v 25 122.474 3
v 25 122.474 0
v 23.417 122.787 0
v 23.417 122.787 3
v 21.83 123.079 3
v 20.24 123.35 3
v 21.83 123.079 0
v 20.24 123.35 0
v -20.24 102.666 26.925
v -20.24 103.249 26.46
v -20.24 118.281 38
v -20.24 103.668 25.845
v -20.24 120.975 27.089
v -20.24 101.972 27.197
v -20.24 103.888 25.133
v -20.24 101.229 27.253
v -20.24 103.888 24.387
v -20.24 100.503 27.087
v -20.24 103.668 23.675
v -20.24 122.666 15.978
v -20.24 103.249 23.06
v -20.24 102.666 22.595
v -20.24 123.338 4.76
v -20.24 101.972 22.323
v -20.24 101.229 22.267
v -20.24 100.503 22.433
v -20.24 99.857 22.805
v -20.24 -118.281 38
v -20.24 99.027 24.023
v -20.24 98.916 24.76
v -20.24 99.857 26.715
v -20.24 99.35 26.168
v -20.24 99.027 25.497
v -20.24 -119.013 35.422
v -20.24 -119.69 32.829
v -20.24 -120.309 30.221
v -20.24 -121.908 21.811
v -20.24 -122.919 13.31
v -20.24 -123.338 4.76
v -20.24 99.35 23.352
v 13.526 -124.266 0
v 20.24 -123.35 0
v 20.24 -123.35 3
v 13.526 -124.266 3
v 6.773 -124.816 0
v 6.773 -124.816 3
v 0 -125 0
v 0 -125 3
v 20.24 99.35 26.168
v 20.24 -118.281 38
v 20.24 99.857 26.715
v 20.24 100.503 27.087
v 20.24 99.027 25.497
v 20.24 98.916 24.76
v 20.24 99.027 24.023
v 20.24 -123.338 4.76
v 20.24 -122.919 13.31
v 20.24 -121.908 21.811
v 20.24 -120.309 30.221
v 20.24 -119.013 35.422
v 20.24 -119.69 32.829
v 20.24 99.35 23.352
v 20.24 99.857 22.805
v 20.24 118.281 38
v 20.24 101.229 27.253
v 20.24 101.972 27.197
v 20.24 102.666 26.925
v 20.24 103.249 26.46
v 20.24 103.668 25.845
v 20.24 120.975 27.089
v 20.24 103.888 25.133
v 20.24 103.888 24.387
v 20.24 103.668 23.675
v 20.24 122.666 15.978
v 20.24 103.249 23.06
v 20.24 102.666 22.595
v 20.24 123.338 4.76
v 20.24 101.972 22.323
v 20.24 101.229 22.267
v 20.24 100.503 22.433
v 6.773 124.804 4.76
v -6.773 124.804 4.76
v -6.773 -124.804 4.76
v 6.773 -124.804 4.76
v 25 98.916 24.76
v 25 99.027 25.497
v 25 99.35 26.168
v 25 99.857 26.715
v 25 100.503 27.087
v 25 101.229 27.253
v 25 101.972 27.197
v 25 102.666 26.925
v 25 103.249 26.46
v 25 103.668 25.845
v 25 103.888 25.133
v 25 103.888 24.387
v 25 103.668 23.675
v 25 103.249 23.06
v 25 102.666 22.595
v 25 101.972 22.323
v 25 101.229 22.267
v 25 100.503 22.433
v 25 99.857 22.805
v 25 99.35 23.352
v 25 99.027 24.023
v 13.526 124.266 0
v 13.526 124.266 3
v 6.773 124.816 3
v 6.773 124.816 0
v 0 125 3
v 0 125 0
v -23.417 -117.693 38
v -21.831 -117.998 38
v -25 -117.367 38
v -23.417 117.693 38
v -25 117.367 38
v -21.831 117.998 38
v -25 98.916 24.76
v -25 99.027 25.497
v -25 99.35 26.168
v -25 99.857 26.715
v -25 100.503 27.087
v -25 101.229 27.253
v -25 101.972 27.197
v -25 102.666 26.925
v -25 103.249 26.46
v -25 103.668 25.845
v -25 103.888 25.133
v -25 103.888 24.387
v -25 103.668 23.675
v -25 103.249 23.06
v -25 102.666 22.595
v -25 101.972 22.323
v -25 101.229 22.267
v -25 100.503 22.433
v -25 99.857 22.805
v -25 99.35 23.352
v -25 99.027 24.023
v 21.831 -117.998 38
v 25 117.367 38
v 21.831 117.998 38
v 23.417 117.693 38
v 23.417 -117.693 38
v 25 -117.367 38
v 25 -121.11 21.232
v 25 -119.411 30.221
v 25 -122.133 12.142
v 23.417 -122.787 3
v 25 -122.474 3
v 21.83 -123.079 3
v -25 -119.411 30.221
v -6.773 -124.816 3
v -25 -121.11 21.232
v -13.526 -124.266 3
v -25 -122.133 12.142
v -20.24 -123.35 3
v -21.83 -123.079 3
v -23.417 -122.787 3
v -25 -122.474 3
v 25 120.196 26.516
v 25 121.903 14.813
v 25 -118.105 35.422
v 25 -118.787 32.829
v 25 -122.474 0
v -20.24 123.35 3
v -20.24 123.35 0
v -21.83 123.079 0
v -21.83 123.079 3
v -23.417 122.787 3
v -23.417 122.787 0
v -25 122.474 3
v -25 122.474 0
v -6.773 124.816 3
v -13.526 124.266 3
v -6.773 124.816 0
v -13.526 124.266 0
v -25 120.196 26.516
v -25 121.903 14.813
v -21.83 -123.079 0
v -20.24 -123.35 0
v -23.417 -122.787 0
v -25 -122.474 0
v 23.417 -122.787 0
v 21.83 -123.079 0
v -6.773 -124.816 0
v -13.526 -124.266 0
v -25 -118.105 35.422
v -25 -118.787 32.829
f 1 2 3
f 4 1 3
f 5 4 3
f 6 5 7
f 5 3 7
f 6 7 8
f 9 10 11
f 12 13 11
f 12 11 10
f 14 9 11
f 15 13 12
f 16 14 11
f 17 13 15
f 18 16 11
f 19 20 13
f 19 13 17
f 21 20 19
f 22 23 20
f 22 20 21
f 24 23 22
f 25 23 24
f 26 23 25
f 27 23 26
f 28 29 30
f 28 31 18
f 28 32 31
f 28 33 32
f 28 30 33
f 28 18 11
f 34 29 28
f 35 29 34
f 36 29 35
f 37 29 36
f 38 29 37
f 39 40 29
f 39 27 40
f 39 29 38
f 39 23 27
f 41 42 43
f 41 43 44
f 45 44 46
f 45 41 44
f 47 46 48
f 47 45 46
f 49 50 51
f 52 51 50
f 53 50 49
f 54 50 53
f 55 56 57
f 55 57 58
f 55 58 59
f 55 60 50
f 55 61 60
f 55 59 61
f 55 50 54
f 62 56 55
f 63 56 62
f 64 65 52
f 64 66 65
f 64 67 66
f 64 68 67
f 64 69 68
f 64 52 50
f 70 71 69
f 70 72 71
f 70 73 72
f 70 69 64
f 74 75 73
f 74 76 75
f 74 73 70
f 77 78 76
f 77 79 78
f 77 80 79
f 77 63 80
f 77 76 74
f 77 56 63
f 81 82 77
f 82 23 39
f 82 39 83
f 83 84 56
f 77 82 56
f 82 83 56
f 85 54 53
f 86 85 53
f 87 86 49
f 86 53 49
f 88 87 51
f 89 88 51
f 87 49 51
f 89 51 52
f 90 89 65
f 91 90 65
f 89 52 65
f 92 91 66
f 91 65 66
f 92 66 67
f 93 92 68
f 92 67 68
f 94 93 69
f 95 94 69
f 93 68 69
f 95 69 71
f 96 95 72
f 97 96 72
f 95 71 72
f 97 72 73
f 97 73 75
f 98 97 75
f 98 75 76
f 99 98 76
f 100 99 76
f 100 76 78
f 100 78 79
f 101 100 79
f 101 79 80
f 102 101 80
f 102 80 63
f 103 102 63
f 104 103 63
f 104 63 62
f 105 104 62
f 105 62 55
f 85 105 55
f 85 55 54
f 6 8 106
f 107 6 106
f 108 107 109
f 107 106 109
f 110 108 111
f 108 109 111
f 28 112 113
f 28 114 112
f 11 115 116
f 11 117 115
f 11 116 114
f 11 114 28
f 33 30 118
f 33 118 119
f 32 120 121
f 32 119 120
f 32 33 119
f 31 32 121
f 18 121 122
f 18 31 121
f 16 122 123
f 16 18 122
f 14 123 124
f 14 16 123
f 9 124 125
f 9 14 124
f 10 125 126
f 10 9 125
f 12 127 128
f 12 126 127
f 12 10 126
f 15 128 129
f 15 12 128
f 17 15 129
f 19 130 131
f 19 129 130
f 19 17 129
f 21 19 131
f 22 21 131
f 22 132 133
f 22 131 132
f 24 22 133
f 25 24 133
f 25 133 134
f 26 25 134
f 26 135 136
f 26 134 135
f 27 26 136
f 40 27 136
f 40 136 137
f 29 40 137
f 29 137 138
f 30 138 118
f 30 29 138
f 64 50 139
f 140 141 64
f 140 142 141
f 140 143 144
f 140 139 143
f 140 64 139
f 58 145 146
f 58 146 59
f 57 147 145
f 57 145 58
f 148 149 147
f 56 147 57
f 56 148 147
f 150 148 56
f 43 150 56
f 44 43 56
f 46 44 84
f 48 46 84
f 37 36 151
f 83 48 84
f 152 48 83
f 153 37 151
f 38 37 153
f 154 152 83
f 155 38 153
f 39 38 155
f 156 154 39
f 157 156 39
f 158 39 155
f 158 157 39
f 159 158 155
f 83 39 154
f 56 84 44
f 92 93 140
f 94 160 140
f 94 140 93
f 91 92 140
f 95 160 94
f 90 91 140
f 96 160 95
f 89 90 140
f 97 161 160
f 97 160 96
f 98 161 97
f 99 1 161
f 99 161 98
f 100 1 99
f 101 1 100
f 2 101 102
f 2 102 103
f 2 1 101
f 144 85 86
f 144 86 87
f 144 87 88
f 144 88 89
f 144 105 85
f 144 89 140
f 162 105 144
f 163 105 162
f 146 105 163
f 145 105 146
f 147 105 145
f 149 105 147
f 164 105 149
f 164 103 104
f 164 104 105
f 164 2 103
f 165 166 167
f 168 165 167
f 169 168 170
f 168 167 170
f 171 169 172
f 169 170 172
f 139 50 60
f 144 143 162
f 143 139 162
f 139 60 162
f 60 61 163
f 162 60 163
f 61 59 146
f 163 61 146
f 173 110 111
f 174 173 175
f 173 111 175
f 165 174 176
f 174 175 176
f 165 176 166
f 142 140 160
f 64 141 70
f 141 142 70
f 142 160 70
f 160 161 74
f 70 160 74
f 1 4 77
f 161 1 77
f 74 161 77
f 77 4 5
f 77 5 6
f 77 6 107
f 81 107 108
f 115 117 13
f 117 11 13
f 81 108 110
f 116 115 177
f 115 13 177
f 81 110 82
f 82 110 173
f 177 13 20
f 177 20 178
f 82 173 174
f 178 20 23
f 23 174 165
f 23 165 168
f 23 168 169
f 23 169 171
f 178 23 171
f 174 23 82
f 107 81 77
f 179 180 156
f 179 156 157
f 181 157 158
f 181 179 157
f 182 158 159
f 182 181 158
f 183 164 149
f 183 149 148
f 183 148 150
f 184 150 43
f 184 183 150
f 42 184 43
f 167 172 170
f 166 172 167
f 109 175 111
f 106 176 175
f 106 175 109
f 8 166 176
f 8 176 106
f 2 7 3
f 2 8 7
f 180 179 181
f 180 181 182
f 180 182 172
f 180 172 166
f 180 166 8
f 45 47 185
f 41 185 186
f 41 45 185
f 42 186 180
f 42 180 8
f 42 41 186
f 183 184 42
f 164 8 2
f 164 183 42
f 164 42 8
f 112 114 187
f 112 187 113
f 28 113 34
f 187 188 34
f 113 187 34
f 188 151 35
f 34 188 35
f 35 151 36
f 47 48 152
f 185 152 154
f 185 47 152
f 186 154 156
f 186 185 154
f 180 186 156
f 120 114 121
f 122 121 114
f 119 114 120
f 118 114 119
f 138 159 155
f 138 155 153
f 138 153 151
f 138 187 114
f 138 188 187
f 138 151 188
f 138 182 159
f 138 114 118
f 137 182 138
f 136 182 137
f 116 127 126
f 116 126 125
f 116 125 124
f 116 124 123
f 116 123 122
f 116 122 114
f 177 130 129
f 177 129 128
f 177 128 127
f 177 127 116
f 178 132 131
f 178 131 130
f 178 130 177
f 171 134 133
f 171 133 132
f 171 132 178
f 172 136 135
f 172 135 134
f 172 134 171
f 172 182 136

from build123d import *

# Parameters (mm, degrees)
F1_DEPTH      = 4.76
F4_DEPTH      = 38
F8_R          = 2.5
F9_DEPTH      = 4.7610001
F9_DEPTH_BACK = 45.2410001


# Not quite as in the source:
# - a feature names something its author has since deleted; it is built from what else it names


with BuildPart() as f1:
    # F0 (on Top) → F1 (new body)
    with BuildSketch(Plane.XY):
        with BuildLine():
            Line((20.24, 120.3093612318), (20.24, 123.3504860144))
            ThreePointArc((20.24, 123.3504860144), (10.1535522896, 124.5869390261), (0, 125))
            Line((0, 125), (0, 122))
            ThreePointArc((0, 122), (10.1552432202, 121.5766056244), (20.24, 120.3093612318))
        make_face()
        with BuildLine():
            Line((25, 90.3494910666), (25, 119.4110547646))
            ThreePointArc((25, 119.4110547646), (22.6244588582, 119.8838348626), (20.24, 120.3093612318))
            Line((20.24, 120.3093612318), (20.24, 105.3494910666))
            Line((20.24, 105.3494910666), (20.24, 90.3494910666))
            Line((20.24, 90.3494910666), (25, 90.3494910666))
        make_face()
        with BuildLine():
            ThreePointArc((-20.24, -120.3093612318), (-10.1552432202, -121.5766056244), (0, -122))
            Line((0, -122), (0, 0))
            Line((0, 0), (0, 101.8494910666))
            Line((0, 101.8494910666), (-3.5, 101.8494910666))
            Line((-3.5, 101.8494910666), (-3.5, 108.8494910666))
            Line((-3.5, 108.8494910666), (0, 108.8494910666))
            Line((0, 108.8494910666), (0, 122))
            ThreePointArc((0, 122), (-10.1552432202, 121.5766056244), (-20.24, 120.3093612318))
            Line((-20.24, 120.3093612318), (-20.24, 107.6747455333))
            Line((-20.24, 107.6747455333), (-20.24, 90.3494910666))
            Line((-20.24, 90.3494910666), (-20.24, -120.3093612318))
        make_face()
        with BuildLine():
            Line((0, 0), (0, -122))
            ThreePointArc((0, -122), (10.1552432202, -121.5766056244), (20.24, -120.3093612318))
            Line((20.24, -120.3093612318), (20.24, 90.3494910666))
            Line((20.24, 90.3494910666), (20.24, 105.3494910666))
            Line((20.24, 105.3494910666), (20.24, 120.3093612318))
            ThreePointArc((20.24, 120.3093612318), (10.1552432202, 121.5766056244), (0, 122))
            Line((0, 122), (0, 108.8494910666))
            Line((0, 108.8494910666), (3.5, 108.8494910666))
            Line((3.5, 108.8494910666), (3.5, 101.8494910666))
            Line((3.5, 101.8494910666), (0, 101.8494910666))
            Line((0, 101.8494910666), (0, 0))
        make_face()
        with BuildLine():
            Line((0, 122), (0, 125))
            ThreePointArc((0, 125), (-10.1535522896, 124.5869390261), (-20.24, 123.3504860144))
            Line((-20.24, 123.3504860144), (-20.24, 120.3093612318))
            ThreePointArc((-20.24, 120.3093612318), (-10.1552432202, 121.5766056244), (0, 122))
        make_face()
        with BuildLine():
            Line((25, -119.4110547646), (25, 90.3494910666))
            Line((25, 90.3494910666), (20.24, 90.3494910666))
            Line((20.24, 90.3494910666), (20.24, -120.3093612318))
            ThreePointArc((20.24, -120.3093612318), (22.6244588582, -119.8838348626), (25, -119.4110547646))
        make_face()
        with BuildLine():
            ThreePointArc((-20.24, 120.3093612318), (-22.6244588582, 119.8838348626), (-25, 119.4110547646))
            Line((-25, 119.4110547646), (-25, 90.3494910666))
            Line((-25, 90.3494910666), (-20.24, 90.3494910666))
            Line((-20.24, 90.3494910666), (-20.24, 107.6747455333))
            Line((-20.24, 107.6747455333), (-20.24, 120.3093612318))
        make_face()
        with BuildLine():
            ThreePointArc((-25, -119.4110547646), (-22.6244588582, -119.8838348626), (-20.24, -120.3093612318))
            Line((-20.24, -120.3093612318), (-20.24, 90.3494910666))
            Line((-20.24, 90.3494910666), (-25, 90.3494910666))
            Line((-25, 90.3494910666), (-25, -119.4110547646))
        make_face()
    extrude(amount=F1_DEPTH)

    # F0 (on Top) → F4 (join)
    with BuildSketch(Plane.XY):
        with BuildLine():
            ThreePointArc((-20.24, 123.3504860144), (-22.6242401752, 122.9355268281), (-25, 122.4744871392))
            Line((-25, 122.4744871392), (-25, 119.4110547646))
            ThreePointArc((-25, 119.4110547646), (-22.6244588582, 119.8838348626), (-20.24, 120.3093612318))
            Line((-20.24, 120.3093612318), (-20.24, 123.3504860144))
        make_face()
        with BuildLine():
            ThreePointArc((-20.24, 120.3093612318), (-22.6244588582, 119.8838348626), (-25, 119.4110547646))
            Line((-25, 119.4110547646), (-25, 90.3494910666))
            Line((-25, 90.3494910666), (-20.24, 90.3494910666))
            Line((-20.24, 90.3494910666), (-20.24, 107.6747455333))
            Line((-20.24, 107.6747455333), (-20.24, 120.3093612318))
        make_face()
        with BuildLine():
            Line((25, 90.3494910666), (25, 119.4110547646))
            ThreePointArc((25, 119.4110547646), (22.6244588582, 119.8838348626), (20.24, 120.3093612318))
            Line((20.24, 120.3093612318), (20.24, 105.3494910666))
            Line((20.24, 105.3494910666), (20.24, 90.3494910666))
            Line((20.24, 90.3494910666), (25, 90.3494910666))
        make_face()
        with BuildLine():
            Line((25, 119.4110547646), (25, 122.4744871392))
            ThreePointArc((25, 122.4744871392), (22.6242401752, 122.9355268281), (20.24, 123.3504860144))
            Line((20.24, 123.3504860144), (20.24, 120.3093612318))
            ThreePointArc((20.24, 120.3093612318), (22.6244588582, 119.8838348626), (25, 119.4110547646))
        make_face()
        with BuildLine():
            Line((25, -119.4110547646), (25, 90.3494910666))
            Line((25, 90.3494910666), (20.24, 90.3494910666))
            Line((20.24, 90.3494910666), (20.24, -120.3093612318))
            ThreePointArc((20.24, -120.3093612318), (22.6244588582, -119.8838348626), (25, -119.4110547646))
        make_face()
        with BuildLine():
            ThreePointArc((-25, -119.4110547646), (-22.6244588582, -119.8838348626), (-20.24, -120.3093612318))
            Line((-20.24, -120.3093612318), (-20.24, 90.3494910666))
            Line((-20.24, 90.3494910666), (-25, 90.3494910666))
            Line((-25, 90.3494910666), (-25, -119.4110547646))
        make_face()
    extrude(amount=F4_DEPTH)

    # F2 (on Front) → F6 (revolve, cut)
    with BuildSketch(Plane.XZ):
        with BuildLine():
            ThreePointArc((0, 128), (88.3883476483, 91.3883476483), (125, 3))
            Line((125, 3), (150, 3))
            ThreePointArc((150, 3), (106.066017178, 109.066017178), (0, 153))
            Line((0, 153), (0, 128))
        make_face()
    revolve(axis=Axis((0, 0, 64), (0, 0, 1)), mode=Mode.SUBTRACT)

    # F7: F1 across face


with BuildPart() as f1_1:
    add(f1.part)
    add(f1.part.mirror(Plane.XZ))

    # F8 (on face) → F9 (cut, two sides)
    with BuildSketch(Plane(origin=(20.24, 0, 0), x_dir=(0, -1, 0), z_dir=(-1, 0, 0))) as f9_sk:
        with Locations((-101.4159989458, 24.76)):
            Circle(F8_R)
    extrude(amount=-F9_DEPTH, mode=Mode.SUBTRACT)
    extrude(f9_sk.sketch, amount=F9_DEPTH_BACK, mode=Mode.SUBTRACT)


solid = f1_1.part
